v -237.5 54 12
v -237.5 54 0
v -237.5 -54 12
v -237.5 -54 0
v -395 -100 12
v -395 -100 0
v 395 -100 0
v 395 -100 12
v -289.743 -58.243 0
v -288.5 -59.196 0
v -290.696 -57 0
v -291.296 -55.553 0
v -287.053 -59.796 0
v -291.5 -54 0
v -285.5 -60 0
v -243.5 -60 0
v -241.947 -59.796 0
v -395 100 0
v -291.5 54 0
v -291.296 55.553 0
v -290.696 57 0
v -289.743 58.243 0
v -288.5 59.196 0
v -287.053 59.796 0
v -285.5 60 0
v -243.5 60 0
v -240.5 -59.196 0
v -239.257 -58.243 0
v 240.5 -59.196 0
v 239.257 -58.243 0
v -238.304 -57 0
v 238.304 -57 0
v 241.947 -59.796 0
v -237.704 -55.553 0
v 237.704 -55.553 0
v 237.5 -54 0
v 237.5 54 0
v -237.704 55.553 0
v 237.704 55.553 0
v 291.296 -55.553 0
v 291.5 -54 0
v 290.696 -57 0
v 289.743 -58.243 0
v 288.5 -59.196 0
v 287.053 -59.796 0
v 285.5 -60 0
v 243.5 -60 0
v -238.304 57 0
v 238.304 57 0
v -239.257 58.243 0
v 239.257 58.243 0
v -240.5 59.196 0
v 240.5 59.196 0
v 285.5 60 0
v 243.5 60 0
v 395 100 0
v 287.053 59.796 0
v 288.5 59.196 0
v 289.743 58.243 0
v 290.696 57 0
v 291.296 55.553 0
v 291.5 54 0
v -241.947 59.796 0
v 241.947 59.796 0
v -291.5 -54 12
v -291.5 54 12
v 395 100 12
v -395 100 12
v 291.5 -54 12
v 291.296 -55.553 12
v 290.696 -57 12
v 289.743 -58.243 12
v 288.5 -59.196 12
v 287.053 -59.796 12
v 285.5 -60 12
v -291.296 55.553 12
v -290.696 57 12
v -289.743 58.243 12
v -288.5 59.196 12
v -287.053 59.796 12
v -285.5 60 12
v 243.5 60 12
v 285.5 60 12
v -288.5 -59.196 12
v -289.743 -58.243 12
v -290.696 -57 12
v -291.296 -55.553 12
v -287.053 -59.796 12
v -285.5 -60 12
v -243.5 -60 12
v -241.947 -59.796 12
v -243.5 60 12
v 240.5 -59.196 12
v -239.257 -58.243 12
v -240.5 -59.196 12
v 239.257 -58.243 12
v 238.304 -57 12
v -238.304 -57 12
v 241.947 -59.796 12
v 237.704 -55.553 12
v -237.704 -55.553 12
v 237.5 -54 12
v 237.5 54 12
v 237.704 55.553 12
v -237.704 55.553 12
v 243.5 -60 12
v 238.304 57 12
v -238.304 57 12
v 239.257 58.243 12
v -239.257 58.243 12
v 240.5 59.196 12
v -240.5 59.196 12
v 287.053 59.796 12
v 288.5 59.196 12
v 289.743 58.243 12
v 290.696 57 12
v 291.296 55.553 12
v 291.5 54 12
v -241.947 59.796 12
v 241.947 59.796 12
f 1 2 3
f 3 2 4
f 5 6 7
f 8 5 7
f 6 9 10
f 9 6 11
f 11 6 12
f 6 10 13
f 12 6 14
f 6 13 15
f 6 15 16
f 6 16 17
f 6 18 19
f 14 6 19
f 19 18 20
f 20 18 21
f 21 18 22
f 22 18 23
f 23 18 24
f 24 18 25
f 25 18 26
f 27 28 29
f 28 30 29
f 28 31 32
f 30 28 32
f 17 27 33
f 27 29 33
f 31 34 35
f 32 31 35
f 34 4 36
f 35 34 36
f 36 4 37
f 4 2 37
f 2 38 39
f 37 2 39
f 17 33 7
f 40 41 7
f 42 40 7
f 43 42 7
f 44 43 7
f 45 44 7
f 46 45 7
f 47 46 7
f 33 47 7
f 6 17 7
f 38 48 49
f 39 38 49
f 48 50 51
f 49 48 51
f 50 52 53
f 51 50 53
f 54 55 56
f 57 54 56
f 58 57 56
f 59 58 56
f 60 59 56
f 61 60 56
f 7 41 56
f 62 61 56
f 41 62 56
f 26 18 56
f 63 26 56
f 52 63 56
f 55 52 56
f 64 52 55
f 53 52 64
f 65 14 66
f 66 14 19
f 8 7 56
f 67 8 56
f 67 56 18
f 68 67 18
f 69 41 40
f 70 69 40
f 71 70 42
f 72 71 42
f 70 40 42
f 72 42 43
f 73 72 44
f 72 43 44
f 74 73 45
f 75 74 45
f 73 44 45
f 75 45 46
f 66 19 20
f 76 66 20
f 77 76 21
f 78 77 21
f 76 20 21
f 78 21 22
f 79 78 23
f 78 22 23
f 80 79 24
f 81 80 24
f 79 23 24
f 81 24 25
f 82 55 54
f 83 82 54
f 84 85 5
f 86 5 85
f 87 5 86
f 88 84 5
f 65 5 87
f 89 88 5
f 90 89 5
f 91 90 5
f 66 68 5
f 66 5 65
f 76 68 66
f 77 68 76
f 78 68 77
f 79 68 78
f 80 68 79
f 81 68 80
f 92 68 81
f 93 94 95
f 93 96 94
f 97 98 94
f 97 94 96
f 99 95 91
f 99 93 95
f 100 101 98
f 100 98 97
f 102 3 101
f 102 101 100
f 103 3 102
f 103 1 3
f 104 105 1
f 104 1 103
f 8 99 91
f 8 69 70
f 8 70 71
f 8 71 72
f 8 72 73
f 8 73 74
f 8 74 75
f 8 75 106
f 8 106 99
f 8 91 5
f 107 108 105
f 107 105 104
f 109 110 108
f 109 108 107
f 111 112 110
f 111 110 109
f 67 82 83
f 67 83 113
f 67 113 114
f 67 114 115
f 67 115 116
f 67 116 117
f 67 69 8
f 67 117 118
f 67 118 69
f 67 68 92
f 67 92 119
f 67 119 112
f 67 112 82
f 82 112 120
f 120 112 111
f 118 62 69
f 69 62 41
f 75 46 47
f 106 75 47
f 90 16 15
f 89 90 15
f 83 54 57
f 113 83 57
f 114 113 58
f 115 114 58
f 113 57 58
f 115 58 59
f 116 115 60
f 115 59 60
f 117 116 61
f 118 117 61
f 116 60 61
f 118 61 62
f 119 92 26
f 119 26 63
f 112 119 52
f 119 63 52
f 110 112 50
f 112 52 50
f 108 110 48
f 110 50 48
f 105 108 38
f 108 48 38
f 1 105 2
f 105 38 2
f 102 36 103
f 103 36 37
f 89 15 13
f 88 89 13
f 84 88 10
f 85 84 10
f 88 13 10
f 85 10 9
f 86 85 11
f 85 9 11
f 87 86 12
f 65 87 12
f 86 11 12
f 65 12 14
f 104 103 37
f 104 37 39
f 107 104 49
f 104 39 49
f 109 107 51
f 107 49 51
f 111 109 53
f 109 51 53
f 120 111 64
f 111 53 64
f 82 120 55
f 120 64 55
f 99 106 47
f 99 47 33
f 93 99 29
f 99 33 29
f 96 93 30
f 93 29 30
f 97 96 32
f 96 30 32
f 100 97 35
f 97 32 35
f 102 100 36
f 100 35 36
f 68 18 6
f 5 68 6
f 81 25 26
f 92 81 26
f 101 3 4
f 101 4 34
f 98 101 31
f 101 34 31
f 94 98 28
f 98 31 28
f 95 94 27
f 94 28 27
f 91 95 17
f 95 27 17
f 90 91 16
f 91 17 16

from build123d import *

# Parameters (mm, degrees)
F1_DEPTH = 12


with BuildPart() as f1:
    # F0 (on Top) → F1 (new body)
    with BuildSketch(Plane.XY):
        Polygon((395, 100), (0, 100), (-395, 100), (-395, -100), (0, -100), (395, -100), align=None)
        with BuildLine():
            Line((-285.5, 60), (-243.5, 60))
            ThreePointArc((-243.5, 60), (-239.257359, 58.242641), (-237.5, 54))
            Line((-237.5, 54), (-237.5, -54))
            ThreePointArc((-237.5, -54), (-239.257359, -58.242641), (-243.5, -60))
            Line((-243.5, -60), (-285.5, -60))
            ThreePointArc((-285.5, -60), (-289.742641, -58.242641), (-291.5, -54))
            Line((-291.5, -54), (-291.5, 54))
            ThreePointArc((-291.5, 54), (-289.742641, 58.242641), (-285.5, 60))
        make_face(mode=Mode.SUBTRACT)
        with BuildLine():
            ThreePointArc((237.5, 54), (239.257359, 58.242641), (243.5, 60))
            Line((243.5, 60), (285.5, 60))
            ThreePointArc((285.5, 60), (289.742641, 58.242641), (291.5, 54))
            Line((291.5, 54), (291.5, -54))
            ThreePointArc((291.5, -54), (289.742641, -58.242641), (285.5, -60))
            Line((285.5, -60), (243.5, -60))
            ThreePointArc((243.5, -60), (239.257359, -58.242641), (237.5, -54))
            Line((237.5, -54), (237.5, 54))
        make_face(mode=Mode.SUBTRACT)
    extrude(amount=F1_DEPTH)


solid = f1.part
